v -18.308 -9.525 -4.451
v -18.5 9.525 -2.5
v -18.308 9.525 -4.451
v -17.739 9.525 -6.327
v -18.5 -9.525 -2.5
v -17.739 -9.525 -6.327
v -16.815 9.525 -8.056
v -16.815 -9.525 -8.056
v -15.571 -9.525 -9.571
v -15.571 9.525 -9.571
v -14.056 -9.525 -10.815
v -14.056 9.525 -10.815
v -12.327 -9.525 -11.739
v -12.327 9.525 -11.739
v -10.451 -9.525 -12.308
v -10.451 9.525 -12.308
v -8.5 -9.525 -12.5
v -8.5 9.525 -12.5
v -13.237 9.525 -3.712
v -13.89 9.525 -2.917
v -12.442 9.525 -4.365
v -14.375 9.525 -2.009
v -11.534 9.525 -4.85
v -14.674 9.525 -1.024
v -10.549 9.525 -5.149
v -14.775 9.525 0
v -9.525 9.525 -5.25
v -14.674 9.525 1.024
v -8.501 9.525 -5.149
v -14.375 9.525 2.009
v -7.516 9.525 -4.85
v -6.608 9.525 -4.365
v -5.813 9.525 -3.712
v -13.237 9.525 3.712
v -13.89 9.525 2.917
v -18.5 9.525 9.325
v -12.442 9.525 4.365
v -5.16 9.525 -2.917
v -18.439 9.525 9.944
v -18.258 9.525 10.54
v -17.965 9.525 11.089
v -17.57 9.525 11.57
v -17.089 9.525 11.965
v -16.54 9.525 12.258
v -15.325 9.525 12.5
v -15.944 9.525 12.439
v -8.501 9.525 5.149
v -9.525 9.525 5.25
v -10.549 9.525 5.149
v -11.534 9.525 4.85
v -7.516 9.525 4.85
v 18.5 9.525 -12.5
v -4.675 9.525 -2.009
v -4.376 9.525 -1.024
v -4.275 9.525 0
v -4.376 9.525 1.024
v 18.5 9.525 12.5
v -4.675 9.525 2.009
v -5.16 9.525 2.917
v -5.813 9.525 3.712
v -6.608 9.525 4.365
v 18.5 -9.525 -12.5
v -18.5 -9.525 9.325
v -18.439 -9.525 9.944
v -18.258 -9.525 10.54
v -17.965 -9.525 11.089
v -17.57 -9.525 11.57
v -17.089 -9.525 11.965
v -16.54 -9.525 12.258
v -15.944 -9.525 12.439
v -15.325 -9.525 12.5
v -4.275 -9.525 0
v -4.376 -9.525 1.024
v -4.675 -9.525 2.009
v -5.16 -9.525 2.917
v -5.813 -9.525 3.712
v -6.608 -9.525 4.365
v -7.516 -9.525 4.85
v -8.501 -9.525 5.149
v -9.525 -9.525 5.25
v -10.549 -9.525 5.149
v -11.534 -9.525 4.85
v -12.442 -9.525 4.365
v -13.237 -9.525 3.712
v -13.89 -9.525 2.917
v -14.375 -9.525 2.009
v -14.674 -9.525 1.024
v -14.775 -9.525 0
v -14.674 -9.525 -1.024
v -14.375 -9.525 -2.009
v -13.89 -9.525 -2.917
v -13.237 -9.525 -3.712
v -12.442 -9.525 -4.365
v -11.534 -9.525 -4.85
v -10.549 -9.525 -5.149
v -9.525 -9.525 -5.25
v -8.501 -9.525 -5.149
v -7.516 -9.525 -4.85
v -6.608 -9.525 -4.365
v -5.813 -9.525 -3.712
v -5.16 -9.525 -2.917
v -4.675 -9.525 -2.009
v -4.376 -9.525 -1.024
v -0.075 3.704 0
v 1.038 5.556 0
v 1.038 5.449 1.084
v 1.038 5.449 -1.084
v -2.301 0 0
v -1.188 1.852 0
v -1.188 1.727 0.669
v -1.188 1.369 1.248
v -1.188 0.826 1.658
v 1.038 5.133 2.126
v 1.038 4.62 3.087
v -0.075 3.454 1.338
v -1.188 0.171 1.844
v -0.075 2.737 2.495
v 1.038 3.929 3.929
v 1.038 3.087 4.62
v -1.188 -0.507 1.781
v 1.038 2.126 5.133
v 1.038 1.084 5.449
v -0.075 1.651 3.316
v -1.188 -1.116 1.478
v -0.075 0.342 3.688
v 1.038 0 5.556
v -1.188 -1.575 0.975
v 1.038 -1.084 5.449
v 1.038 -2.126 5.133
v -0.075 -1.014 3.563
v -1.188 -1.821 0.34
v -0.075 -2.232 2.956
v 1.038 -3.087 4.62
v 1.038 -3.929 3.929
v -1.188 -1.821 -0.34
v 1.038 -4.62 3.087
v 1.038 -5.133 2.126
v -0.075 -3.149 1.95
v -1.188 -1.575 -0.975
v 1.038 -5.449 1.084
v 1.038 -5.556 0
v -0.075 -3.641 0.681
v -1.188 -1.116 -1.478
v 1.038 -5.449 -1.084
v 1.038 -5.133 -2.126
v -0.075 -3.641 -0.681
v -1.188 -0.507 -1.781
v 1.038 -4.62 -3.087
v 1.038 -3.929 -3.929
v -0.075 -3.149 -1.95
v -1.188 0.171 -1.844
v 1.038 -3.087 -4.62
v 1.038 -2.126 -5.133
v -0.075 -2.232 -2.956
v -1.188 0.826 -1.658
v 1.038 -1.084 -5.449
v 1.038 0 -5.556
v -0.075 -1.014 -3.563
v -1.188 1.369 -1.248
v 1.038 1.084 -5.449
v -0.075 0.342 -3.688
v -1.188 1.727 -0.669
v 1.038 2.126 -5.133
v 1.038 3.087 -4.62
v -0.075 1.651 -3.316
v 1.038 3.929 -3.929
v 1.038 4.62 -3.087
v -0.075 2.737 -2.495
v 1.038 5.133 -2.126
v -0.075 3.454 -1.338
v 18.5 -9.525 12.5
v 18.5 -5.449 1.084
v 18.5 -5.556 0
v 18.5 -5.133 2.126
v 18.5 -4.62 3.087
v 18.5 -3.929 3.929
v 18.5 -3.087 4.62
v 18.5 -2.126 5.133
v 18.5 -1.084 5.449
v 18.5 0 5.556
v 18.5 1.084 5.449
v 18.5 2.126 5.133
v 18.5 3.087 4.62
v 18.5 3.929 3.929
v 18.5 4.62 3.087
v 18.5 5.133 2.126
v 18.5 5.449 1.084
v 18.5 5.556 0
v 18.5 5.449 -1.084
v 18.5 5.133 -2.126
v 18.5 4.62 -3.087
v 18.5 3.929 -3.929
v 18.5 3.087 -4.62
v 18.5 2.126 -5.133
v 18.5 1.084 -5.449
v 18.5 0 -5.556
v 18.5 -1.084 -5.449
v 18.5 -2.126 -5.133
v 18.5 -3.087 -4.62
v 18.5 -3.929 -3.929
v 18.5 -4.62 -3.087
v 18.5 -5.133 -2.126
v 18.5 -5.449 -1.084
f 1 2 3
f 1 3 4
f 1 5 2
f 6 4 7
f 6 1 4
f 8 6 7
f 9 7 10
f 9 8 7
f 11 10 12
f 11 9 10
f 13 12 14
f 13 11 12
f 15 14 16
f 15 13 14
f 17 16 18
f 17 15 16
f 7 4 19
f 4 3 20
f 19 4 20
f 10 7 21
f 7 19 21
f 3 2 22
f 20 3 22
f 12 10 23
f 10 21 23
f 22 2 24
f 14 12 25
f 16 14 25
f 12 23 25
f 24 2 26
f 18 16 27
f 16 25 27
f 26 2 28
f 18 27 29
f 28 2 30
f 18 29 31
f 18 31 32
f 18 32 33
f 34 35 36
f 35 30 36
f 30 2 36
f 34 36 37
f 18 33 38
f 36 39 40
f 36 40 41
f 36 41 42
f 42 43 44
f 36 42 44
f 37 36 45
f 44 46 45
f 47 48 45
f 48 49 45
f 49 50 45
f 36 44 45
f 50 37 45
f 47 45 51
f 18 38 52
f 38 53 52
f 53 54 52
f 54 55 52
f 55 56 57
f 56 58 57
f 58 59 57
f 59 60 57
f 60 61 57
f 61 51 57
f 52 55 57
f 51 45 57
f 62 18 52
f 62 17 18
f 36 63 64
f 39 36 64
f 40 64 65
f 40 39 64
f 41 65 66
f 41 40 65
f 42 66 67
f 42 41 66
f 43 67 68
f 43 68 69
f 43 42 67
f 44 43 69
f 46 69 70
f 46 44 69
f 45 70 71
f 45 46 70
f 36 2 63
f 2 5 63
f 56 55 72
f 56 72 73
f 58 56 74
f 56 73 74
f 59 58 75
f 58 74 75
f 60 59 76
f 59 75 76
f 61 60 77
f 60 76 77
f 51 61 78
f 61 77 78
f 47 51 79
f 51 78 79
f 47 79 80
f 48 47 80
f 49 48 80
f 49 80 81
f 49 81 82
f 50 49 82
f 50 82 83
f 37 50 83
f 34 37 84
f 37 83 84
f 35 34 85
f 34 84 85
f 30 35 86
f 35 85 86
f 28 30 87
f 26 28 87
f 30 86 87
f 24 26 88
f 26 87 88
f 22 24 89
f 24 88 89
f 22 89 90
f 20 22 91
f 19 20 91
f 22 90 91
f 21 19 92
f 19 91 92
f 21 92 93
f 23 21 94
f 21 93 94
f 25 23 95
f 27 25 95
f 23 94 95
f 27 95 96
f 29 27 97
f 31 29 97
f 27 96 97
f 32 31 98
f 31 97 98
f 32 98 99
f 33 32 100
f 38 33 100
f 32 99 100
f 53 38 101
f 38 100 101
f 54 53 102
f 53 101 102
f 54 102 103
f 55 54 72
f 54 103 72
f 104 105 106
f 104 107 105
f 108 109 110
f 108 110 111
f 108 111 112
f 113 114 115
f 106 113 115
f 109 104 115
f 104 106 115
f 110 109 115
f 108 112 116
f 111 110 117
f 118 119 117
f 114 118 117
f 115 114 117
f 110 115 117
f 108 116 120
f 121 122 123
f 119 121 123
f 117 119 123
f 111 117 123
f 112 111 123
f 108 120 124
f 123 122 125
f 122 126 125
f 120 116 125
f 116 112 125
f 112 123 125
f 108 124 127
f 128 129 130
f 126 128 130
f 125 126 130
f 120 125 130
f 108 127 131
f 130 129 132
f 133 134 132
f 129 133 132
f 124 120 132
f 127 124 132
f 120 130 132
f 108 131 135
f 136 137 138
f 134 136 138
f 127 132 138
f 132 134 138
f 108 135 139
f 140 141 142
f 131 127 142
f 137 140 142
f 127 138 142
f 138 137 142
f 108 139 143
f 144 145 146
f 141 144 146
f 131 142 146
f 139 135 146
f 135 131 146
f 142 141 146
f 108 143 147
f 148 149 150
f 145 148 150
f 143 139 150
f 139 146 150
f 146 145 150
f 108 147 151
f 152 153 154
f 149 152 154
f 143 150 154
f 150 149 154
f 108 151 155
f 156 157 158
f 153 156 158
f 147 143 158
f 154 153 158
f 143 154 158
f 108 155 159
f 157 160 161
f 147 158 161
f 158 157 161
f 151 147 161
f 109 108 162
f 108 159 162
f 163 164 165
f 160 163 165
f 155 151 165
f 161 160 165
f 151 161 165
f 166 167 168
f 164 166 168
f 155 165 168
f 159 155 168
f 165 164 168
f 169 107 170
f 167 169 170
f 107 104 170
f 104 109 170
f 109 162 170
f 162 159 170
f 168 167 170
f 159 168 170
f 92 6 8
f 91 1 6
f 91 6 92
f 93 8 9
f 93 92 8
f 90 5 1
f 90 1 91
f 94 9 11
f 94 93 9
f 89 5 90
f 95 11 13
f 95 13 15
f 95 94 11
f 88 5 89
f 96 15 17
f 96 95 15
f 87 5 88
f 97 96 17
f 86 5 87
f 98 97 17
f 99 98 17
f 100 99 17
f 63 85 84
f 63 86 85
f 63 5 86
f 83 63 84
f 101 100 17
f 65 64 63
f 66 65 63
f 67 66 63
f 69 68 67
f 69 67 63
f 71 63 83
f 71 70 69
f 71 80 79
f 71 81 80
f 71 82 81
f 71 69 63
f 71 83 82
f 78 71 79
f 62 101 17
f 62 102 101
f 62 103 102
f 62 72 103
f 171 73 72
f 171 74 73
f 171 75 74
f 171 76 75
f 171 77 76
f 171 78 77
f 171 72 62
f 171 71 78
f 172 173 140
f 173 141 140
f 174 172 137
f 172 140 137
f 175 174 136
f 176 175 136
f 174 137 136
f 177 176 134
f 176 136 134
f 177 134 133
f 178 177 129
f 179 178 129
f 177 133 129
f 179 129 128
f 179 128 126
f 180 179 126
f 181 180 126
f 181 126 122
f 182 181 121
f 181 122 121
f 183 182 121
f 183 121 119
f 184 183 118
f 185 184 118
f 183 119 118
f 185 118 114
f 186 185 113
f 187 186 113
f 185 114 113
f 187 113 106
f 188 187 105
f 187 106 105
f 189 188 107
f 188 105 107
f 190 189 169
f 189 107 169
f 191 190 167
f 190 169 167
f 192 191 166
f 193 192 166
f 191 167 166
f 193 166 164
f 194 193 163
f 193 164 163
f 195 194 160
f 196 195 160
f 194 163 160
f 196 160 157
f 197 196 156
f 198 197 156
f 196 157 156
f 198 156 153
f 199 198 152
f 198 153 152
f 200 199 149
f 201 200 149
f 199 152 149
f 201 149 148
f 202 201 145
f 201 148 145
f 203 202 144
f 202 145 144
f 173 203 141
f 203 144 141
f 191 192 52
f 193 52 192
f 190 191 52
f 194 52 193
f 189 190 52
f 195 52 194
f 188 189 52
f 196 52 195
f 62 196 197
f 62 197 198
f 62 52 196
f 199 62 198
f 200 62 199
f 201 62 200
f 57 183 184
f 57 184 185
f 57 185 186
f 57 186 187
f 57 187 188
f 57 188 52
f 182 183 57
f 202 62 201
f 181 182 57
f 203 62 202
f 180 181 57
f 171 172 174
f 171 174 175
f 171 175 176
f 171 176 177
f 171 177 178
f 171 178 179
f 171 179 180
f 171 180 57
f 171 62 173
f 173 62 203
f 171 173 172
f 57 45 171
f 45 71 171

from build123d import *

# Parameters (mm, degrees)
F0_W     = 37
F0_H     = 25
F2_DEPTH = 9.525
F1_R     = 5.25
F3_DEPTH = 12.5
F4_R     = 10
F6_D     = 11.1125
F6_DEPTH = 17.4625
F6_TIP   = 3.3385318145
F7_R     = 3.175


with BuildPart() as f2:
    # F0 (on Front) → F2 (new body, symmetric)
    with BuildSketch(Plane.XZ):
        Rectangle(F0_W, F0_H)
    extrude(amount=F2_DEPTH, both=True)

    # F1 (on Front) → F3 (cut, symmetric)
    with BuildSketch(Plane.XZ):
        with Locations((-9.525, 0)):
            Circle(F1_R)
    extrude(amount=F3_DEPTH, both=True, mode=Mode.SUBTRACT)

    # F4
    f4_edges = [f2.edges().sort_by_distance(p)[0] for p in [
        (-18.5, 0, -12.5),
    ]]
    fillet(f4_edges, radius=F4_R)

    # F6
    with Locations(Plane.YZ.offset(18.5)):
        with Locations((0, 0)):
            Hole(F6_D / 2, depth=F6_DEPTH)
            with Locations((0, 0, -(F6_DEPTH + F6_TIP / 2))):  # 118° drill point
                Cone(0, F6_D / 2, F6_TIP, mode=Mode.SUBTRACT)

    # F7
    f7_edges = [f2.edges().sort_by_distance(p)[0] for p in [
        (-18.5, 0, 12.5),
    ]]
    fillet(f7_edges, radius=F7_R)


solid = f2.part
